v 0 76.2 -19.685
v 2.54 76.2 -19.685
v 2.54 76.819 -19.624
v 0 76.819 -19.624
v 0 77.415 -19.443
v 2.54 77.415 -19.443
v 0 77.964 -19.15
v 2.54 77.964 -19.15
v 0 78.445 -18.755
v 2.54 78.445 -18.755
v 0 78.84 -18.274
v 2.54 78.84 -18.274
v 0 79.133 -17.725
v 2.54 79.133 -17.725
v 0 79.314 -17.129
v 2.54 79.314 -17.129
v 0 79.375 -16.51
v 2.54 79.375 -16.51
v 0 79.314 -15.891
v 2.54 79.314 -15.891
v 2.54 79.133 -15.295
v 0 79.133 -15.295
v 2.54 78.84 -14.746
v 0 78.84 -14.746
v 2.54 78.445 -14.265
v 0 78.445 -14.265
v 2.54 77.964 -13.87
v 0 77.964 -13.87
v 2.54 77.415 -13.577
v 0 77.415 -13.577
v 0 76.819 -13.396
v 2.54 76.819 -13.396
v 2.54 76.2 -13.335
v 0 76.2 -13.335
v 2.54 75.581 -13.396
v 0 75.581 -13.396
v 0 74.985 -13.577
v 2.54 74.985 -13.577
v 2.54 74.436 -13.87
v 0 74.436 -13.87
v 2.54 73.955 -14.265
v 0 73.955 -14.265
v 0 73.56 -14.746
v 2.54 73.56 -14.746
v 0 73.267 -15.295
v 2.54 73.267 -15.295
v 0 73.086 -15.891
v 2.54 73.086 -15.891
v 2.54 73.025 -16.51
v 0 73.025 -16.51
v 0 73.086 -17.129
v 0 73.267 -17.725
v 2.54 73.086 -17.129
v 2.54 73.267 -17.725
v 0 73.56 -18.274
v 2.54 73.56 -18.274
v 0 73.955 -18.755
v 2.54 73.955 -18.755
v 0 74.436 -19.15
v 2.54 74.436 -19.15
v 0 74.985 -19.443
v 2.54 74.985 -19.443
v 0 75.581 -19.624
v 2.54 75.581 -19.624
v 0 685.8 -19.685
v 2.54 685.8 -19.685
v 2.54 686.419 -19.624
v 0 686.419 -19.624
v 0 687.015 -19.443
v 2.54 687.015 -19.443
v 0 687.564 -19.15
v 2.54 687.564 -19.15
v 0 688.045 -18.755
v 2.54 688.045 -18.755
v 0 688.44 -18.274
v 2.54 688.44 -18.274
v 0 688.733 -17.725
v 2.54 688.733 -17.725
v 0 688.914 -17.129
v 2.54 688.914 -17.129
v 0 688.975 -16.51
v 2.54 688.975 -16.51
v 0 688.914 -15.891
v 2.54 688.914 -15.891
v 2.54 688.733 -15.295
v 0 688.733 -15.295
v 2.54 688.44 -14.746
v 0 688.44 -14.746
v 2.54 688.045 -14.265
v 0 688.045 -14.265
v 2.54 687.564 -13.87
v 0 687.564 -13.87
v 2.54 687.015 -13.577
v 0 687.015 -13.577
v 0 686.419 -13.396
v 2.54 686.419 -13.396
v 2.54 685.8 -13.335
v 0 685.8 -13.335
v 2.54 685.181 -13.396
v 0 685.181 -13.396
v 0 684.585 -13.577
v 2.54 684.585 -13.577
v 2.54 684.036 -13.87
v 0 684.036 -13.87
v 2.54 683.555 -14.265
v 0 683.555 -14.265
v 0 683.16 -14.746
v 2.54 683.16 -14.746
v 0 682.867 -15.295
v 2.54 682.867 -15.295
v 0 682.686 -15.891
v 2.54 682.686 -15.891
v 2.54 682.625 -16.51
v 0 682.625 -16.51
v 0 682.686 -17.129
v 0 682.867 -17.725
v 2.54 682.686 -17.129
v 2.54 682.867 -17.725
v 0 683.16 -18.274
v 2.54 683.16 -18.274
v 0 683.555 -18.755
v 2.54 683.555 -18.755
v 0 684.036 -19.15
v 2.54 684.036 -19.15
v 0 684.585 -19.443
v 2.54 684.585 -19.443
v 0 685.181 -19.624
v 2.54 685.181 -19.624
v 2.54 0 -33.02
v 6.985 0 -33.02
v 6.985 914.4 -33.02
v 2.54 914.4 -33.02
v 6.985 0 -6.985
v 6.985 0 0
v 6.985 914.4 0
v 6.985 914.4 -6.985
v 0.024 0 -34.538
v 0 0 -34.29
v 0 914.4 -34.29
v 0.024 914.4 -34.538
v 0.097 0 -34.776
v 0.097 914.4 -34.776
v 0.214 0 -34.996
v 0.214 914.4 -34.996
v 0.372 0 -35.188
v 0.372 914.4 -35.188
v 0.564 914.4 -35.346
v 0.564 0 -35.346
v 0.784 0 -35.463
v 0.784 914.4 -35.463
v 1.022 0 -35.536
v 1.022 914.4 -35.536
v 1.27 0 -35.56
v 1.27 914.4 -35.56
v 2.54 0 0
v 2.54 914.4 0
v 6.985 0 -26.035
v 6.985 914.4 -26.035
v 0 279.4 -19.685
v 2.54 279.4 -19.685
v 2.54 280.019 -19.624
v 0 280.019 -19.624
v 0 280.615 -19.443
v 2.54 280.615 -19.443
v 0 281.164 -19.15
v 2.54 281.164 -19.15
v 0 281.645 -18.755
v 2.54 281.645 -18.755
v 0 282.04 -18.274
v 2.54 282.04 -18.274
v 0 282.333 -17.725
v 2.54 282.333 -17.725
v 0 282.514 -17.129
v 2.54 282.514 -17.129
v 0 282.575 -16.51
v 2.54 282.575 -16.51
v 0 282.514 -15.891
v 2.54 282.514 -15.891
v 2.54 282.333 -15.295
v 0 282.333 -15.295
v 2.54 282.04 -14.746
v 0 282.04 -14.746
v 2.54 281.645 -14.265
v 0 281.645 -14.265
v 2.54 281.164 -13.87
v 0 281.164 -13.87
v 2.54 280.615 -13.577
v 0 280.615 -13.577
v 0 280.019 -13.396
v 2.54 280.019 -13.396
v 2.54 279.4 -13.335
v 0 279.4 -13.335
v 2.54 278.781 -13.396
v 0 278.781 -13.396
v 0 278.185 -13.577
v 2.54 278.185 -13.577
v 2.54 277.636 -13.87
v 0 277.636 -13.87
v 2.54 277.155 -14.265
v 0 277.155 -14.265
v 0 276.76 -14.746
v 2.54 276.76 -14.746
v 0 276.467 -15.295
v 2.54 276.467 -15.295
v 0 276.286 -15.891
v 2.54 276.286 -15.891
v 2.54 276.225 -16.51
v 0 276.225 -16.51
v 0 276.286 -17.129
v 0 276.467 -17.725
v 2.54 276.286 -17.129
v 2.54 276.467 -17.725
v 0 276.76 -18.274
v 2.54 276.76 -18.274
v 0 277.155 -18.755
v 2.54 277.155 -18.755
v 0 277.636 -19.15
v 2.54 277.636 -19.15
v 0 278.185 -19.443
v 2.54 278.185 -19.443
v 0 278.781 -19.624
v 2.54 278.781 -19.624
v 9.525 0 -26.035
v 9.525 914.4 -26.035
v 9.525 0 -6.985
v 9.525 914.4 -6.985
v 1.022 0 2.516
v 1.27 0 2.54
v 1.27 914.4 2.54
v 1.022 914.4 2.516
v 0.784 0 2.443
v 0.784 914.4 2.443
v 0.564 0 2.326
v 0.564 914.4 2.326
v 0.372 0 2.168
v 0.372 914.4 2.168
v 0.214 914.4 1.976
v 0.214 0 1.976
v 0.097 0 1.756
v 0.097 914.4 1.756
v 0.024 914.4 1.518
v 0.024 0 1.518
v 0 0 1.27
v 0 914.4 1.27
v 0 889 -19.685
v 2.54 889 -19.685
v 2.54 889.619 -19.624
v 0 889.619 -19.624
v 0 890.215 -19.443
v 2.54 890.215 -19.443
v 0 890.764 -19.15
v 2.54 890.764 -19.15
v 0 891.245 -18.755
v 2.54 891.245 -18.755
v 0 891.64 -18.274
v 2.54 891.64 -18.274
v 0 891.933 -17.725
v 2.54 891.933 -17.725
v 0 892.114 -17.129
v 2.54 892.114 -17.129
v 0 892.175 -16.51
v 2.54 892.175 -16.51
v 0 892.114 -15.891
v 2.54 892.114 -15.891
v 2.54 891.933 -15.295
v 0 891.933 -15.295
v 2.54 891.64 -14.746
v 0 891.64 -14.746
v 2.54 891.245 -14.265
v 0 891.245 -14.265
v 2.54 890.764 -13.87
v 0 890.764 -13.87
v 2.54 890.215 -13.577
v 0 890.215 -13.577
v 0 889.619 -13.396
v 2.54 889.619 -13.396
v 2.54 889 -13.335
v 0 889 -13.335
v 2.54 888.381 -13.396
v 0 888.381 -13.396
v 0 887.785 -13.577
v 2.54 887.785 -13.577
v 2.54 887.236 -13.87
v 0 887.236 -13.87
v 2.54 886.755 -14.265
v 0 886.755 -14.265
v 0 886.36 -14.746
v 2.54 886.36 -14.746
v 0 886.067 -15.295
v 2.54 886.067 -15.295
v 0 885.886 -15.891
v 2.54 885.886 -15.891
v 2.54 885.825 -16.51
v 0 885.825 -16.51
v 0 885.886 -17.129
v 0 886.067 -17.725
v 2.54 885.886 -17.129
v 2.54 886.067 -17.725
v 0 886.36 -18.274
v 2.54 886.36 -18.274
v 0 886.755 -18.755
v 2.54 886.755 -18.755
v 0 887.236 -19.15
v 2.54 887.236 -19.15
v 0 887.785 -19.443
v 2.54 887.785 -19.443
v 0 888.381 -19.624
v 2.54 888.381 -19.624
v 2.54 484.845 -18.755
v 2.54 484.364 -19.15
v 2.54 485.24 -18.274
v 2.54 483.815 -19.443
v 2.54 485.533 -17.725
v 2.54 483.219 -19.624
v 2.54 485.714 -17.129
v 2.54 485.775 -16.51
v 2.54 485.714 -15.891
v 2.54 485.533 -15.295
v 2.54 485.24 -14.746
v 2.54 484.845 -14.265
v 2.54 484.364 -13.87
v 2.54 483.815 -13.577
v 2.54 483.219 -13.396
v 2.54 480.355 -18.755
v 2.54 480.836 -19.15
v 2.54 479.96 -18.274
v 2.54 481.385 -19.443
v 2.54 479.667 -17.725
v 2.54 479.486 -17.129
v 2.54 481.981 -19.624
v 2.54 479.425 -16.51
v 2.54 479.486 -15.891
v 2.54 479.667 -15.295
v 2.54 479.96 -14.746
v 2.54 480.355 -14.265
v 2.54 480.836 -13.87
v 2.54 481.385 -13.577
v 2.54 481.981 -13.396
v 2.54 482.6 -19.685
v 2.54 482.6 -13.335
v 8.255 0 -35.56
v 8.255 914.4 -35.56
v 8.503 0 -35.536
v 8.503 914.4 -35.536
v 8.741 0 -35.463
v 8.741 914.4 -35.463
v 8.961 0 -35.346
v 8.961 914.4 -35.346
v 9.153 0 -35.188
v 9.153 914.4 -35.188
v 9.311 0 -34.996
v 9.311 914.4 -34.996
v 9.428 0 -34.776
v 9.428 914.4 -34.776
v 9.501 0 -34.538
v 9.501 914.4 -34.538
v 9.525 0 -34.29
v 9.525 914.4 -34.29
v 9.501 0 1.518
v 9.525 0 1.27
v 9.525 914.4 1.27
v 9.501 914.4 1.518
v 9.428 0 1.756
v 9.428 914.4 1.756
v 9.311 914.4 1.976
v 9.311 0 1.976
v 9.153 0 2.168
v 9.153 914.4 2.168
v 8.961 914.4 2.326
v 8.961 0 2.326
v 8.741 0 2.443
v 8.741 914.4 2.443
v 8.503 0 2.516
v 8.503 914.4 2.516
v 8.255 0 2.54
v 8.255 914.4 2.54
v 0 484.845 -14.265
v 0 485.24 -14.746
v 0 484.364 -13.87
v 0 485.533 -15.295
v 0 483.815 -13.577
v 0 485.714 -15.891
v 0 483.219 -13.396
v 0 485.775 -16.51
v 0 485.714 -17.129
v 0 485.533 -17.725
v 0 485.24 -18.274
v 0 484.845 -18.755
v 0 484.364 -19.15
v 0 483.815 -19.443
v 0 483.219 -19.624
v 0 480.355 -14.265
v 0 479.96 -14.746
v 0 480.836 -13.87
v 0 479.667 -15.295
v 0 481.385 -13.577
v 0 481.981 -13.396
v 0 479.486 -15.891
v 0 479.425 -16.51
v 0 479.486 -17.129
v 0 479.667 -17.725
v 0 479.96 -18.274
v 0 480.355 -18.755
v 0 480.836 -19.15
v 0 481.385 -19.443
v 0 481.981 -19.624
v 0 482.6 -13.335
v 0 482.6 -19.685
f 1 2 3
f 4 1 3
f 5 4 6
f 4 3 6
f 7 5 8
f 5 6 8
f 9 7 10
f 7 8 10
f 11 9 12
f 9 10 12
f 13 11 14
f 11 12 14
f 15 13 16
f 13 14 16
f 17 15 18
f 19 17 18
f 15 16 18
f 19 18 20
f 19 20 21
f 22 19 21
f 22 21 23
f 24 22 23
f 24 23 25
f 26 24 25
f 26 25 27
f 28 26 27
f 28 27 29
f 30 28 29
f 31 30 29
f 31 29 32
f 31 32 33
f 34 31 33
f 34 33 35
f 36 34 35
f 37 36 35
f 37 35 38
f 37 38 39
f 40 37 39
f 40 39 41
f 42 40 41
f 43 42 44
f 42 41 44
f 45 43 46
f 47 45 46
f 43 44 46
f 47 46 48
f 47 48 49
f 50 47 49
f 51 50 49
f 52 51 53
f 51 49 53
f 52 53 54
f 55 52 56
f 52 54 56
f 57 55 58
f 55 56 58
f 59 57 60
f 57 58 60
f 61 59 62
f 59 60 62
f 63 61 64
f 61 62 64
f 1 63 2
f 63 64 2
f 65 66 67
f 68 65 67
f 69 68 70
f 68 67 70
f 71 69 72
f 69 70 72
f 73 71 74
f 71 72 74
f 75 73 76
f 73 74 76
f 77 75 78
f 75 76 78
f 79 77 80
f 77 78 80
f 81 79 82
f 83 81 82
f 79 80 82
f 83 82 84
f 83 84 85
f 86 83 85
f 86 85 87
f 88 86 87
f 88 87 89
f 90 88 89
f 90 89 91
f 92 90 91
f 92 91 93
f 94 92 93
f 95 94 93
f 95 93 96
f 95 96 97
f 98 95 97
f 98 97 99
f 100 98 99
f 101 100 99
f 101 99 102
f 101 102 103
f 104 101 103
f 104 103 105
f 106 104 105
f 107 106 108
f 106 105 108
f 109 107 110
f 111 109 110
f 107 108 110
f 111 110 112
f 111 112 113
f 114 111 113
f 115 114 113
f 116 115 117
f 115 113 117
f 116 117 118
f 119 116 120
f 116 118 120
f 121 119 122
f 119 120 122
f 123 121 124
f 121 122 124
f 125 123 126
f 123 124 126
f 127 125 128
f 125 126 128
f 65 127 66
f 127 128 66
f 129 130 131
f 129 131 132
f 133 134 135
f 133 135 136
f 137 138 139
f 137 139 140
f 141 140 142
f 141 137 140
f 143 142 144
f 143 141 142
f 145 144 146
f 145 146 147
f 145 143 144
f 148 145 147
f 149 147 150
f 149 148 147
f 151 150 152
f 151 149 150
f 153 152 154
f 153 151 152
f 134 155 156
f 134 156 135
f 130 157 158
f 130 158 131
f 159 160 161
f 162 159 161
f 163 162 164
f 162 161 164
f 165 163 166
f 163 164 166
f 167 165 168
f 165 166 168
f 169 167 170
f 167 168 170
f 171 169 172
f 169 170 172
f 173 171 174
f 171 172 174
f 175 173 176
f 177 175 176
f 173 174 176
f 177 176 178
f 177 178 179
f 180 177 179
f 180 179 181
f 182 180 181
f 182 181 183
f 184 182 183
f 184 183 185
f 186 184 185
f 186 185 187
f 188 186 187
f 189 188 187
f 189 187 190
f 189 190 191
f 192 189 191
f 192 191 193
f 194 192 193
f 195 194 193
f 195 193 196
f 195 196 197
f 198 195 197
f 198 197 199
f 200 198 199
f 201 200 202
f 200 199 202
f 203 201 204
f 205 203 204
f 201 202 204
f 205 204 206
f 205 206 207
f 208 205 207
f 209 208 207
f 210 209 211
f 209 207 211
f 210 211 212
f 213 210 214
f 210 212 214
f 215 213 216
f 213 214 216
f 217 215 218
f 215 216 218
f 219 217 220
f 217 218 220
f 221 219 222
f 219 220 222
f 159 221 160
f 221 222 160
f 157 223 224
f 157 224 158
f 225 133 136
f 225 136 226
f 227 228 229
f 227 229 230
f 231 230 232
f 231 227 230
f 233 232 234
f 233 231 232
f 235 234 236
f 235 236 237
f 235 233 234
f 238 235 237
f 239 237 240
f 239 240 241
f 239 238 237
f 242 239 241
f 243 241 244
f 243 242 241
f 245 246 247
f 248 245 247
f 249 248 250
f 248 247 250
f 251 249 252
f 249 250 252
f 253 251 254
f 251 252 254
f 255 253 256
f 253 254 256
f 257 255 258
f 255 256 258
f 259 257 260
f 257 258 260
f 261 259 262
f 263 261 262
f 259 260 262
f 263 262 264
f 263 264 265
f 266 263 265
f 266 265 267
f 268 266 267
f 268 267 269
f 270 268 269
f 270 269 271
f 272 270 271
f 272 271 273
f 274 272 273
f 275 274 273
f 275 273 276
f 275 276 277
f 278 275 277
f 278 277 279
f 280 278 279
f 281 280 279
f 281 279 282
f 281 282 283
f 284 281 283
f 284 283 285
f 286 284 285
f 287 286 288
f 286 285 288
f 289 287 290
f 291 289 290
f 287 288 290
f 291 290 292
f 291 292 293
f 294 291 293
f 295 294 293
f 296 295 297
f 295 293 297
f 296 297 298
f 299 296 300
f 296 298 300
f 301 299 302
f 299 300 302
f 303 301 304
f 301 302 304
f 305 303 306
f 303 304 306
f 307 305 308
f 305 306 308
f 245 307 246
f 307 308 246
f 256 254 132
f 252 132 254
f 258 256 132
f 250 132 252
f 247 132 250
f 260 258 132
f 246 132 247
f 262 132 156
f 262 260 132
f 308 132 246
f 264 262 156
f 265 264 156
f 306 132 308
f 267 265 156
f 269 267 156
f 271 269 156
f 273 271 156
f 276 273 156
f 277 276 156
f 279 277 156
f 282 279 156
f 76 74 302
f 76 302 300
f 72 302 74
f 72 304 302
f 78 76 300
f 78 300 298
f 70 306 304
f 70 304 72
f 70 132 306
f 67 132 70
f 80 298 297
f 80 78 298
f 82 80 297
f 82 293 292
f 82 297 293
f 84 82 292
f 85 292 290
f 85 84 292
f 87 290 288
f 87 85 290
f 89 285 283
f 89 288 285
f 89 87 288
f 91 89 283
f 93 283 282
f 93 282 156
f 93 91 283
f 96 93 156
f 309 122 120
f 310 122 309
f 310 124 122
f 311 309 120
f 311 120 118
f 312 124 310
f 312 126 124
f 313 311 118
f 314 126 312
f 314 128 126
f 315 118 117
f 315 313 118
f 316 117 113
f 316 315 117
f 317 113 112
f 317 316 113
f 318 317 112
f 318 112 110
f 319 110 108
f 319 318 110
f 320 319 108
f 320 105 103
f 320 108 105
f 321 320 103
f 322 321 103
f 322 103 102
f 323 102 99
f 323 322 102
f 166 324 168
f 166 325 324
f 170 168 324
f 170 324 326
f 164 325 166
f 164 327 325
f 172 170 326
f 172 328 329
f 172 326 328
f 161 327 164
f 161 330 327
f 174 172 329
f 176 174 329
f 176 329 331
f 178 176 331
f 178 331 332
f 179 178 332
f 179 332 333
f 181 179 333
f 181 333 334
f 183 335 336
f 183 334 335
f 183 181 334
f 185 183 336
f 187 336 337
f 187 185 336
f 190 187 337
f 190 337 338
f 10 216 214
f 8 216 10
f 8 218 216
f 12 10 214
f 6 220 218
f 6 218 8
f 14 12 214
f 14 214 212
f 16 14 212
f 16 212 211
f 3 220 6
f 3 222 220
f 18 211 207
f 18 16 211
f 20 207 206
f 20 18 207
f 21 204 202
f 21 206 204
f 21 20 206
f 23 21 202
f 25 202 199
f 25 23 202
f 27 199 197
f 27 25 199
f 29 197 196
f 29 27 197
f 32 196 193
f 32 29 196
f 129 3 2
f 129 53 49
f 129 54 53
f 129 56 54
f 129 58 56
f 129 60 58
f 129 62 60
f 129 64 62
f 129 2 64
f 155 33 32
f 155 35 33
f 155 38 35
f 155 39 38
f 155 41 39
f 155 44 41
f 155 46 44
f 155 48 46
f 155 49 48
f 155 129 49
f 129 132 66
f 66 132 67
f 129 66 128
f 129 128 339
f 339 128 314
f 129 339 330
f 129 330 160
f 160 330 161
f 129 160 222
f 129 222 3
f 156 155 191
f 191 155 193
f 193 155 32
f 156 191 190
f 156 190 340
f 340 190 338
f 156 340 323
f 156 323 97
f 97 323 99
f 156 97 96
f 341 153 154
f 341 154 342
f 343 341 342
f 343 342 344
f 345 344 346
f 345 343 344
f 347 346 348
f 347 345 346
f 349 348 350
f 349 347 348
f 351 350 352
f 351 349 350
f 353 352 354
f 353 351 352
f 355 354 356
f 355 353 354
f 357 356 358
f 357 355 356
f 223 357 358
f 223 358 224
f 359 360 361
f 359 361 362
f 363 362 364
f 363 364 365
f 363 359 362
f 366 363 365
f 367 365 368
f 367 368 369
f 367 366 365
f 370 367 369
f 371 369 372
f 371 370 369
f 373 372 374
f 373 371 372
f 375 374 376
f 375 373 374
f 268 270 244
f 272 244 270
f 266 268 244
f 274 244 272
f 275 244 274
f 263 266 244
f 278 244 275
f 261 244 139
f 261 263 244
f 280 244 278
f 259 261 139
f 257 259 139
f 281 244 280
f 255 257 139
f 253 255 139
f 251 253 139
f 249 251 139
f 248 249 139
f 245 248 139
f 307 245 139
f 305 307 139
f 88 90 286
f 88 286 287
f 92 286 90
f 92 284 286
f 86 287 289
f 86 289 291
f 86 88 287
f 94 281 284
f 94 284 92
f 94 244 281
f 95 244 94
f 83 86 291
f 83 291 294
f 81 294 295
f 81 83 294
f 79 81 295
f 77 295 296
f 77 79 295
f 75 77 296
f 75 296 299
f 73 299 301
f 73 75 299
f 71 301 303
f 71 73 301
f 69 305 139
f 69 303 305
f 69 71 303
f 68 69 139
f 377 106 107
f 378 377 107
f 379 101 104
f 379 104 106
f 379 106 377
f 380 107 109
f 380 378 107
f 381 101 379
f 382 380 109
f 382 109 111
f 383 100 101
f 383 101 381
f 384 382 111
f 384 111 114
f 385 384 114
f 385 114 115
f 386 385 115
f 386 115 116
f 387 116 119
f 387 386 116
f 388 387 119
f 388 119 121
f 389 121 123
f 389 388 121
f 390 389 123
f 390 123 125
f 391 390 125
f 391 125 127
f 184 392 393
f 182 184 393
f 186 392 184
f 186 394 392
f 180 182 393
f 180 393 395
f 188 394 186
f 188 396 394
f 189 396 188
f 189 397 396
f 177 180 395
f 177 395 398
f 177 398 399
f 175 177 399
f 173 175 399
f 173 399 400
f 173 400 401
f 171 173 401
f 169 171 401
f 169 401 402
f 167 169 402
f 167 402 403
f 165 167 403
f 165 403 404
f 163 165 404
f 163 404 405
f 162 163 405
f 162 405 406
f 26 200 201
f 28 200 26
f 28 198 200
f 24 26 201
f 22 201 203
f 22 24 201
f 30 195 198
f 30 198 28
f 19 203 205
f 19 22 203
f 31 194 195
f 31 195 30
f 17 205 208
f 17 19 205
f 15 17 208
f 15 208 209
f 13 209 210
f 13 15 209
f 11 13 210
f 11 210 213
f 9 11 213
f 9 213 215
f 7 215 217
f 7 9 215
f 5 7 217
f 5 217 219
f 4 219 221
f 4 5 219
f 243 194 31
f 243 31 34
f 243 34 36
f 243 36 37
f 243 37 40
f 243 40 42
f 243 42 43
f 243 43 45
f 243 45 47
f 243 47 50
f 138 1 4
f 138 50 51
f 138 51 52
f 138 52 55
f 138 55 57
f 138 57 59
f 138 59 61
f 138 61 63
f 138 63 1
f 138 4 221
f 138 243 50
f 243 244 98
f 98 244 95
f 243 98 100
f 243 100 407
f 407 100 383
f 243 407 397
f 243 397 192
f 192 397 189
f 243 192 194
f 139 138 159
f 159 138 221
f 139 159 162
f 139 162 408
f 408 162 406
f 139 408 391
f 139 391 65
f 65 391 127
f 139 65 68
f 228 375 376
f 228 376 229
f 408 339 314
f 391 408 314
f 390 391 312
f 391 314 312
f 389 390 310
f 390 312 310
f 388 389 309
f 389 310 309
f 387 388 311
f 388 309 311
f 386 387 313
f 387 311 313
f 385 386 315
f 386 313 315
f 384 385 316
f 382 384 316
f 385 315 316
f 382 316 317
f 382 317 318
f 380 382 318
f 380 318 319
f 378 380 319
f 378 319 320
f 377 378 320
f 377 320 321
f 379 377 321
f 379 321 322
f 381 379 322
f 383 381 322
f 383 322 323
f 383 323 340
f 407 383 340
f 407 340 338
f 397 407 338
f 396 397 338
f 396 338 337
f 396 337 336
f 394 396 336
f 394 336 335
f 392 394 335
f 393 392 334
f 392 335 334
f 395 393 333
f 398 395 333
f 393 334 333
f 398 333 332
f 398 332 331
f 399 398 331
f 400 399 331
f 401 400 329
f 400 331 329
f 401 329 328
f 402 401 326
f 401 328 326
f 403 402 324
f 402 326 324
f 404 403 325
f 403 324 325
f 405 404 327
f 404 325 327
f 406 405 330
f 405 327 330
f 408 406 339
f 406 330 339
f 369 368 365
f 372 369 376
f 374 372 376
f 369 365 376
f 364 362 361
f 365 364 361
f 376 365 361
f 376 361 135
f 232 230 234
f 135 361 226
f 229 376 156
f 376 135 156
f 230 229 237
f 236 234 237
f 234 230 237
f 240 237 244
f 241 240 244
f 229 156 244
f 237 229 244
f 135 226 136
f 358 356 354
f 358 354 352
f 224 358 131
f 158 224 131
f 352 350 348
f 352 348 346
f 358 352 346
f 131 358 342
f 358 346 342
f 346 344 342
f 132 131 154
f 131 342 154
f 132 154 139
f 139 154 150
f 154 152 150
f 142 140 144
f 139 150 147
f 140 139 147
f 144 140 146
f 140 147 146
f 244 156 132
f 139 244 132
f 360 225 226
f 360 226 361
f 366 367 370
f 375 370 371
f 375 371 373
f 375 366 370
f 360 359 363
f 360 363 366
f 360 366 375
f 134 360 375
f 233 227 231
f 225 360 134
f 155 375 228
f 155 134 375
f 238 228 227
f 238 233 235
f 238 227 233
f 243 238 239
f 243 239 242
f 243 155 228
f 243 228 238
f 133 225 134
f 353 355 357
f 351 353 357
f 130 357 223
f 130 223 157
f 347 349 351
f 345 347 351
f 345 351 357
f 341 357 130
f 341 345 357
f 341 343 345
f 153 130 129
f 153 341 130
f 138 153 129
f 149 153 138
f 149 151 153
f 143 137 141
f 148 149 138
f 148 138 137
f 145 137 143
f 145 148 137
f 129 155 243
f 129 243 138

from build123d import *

# Parameters (mm, degrees)
BOSS_EXTRUDE1_DEPTH = 914.4
CUT_EXTRUDE1_REACH  = 4.54
SKETCH2_R           = 3.175


with BuildPart() as part:
    # Sketch1 → Boss-Extrude1 (new body)
    with BuildSketch(Plane(origin=(0, 0, 0), x_dir=(1, 0, 0), z_dir=(0, 1, 0))):
        with BuildLine():
            Line((9.525, 34.29), (9.525, 26.035))
            Line((9.525, 26.035), (6.985, 26.035))
            Line((6.985, 26.035), (6.985, 33.02))
            Line((6.985, 33.02), (2.54, 33.02))
            Line((2.54, 33.02), (2.54, 0))
            Line((2.54, 0), (6.985, 0))
            Line((6.985, 0), (6.985, 6.985))
            Line((6.985, 6.985), (9.525, 6.985))
            Line((9.525, 6.985), (9.525, -1.27))
            ThreePointArc((9.525, -1.27), (9.153025612, -2.168025612), (8.255, -2.54))
            Line((8.255, -2.54), (1.27, -2.54))
            ThreePointArc((1.27, -2.54), (0.371974388, -2.168025612), (0, -1.27))
            Line((0, -1.27), (0, 34.29))
            ThreePointArc((0, 34.29), (0.371974388, 35.188025612), (1.27, 35.56))
            Line((1.27, 35.56), (8.255, 35.56))
            ThreePointArc((8.255, 35.56), (9.153025612, 35.188025612), (9.525, 34.29))
        make_face()
    extrude(amount=BOSS_EXTRUDE1_DEPTH)

    # Sketch2 → Cut-Extrude1 (cut, up to next)
    with BuildSketch(Plane(origin=(2.54, 0, 0), x_dir=(0, 0, -1), z_dir=(1, 0, 0)), mode=Mode.PRIVATE) as cut_extrude1_sk1:
        with Locations((16.51, 76.2)):
            Circle(SKETCH2_R)
    cut_extrude1_tool1 = extrude(cut_extrude1_sk1.sketch, amount=-CUT_EXTRUDE1_REACH, mode=Mode.PRIVATE) & part.part
    add(cut_extrude1_tool1.solids().sort_by_distance((2.54, 76.2, -16.51))[0], mode=Mode.SUBTRACT)
    # Sketch2 → Cut-Extrude1 (cut, up to next)
    with BuildSketch(Plane(origin=(2.54, 0, 0), x_dir=(0, 0, -1), z_dir=(1, 0, 0)), mode=Mode.PRIVATE) as cut_extrude1_sk2:
        with Locations((16.51, 279.4)):
            Circle(SKETCH2_R)
    cut_extrude1_tool2 = extrude(cut_extrude1_sk2.sketch, amount=-CUT_EXTRUDE1_REACH, mode=Mode.PRIVATE) & part.part
    add(cut_extrude1_tool2.solids().sort_by_distance((2.54, 279.4, -16.51))[0], mode=Mode.SUBTRACT)
    # Sketch2 → Cut-Extrude1 (cut, up to next)
    with BuildSketch(Plane(origin=(2.54, 0, 0), x_dir=(0, 0, -1), z_dir=(1, 0, 0)), mode=Mode.PRIVATE) as cut_extrude1_sk3:
        with Locations((16.51, 482.6)):
            Circle(SKETCH2_R)
    cut_extrude1_tool3 = extrude(cut_extrude1_sk3.sketch, amount=-CUT_EXTRUDE1_REACH, mode=Mode.PRIVATE) & part.part
    add(cut_extrude1_tool3.solids().sort_by_distance((2.54, 482.6, -16.51))[0], mode=Mode.SUBTRACT)
    # Sketch2 → Cut-Extrude1 (cut, up to next)
    with BuildSketch(Plane(origin=(2.54, 0, 0), x_dir=(0, 0, -1), z_dir=(1, 0, 0)), mode=Mode.PRIVATE) as cut_extrude1_sk4:
        with Locations((16.51, 685.8)):
            Circle(SKETCH2_R)
    cut_extrude1_tool4 = extrude(cut_extrude1_sk4.sketch, amount=-CUT_EXTRUDE1_REACH, mode=Mode.PRIVATE) & part.part
    add(cut_extrude1_tool4.solids().sort_by_distance((2.54, 685.8, -16.51))[0], mode=Mode.SUBTRACT)
    # Sketch2 → Cut-Extrude1 (cut, up to next)
    with BuildSketch(Plane(origin=(2.54, 0, 0), x_dir=(0, 0, -1), z_dir=(1, 0, 0)), mode=Mode.PRIVATE) as cut_extrude1_sk5:
        with Locations((16.51, 889)):
            Circle(SKETCH2_R)
    cut_extrude1_tool5 = extrude(cut_extrude1_sk5.sketch, amount=-CUT_EXTRUDE1_REACH, mode=Mode.PRIVATE) & part.part
    add(cut_extrude1_tool5.solids().sort_by_distance((2.54, 889, -16.51))[0], mode=Mode.SUBTRACT)


solid = part.part
